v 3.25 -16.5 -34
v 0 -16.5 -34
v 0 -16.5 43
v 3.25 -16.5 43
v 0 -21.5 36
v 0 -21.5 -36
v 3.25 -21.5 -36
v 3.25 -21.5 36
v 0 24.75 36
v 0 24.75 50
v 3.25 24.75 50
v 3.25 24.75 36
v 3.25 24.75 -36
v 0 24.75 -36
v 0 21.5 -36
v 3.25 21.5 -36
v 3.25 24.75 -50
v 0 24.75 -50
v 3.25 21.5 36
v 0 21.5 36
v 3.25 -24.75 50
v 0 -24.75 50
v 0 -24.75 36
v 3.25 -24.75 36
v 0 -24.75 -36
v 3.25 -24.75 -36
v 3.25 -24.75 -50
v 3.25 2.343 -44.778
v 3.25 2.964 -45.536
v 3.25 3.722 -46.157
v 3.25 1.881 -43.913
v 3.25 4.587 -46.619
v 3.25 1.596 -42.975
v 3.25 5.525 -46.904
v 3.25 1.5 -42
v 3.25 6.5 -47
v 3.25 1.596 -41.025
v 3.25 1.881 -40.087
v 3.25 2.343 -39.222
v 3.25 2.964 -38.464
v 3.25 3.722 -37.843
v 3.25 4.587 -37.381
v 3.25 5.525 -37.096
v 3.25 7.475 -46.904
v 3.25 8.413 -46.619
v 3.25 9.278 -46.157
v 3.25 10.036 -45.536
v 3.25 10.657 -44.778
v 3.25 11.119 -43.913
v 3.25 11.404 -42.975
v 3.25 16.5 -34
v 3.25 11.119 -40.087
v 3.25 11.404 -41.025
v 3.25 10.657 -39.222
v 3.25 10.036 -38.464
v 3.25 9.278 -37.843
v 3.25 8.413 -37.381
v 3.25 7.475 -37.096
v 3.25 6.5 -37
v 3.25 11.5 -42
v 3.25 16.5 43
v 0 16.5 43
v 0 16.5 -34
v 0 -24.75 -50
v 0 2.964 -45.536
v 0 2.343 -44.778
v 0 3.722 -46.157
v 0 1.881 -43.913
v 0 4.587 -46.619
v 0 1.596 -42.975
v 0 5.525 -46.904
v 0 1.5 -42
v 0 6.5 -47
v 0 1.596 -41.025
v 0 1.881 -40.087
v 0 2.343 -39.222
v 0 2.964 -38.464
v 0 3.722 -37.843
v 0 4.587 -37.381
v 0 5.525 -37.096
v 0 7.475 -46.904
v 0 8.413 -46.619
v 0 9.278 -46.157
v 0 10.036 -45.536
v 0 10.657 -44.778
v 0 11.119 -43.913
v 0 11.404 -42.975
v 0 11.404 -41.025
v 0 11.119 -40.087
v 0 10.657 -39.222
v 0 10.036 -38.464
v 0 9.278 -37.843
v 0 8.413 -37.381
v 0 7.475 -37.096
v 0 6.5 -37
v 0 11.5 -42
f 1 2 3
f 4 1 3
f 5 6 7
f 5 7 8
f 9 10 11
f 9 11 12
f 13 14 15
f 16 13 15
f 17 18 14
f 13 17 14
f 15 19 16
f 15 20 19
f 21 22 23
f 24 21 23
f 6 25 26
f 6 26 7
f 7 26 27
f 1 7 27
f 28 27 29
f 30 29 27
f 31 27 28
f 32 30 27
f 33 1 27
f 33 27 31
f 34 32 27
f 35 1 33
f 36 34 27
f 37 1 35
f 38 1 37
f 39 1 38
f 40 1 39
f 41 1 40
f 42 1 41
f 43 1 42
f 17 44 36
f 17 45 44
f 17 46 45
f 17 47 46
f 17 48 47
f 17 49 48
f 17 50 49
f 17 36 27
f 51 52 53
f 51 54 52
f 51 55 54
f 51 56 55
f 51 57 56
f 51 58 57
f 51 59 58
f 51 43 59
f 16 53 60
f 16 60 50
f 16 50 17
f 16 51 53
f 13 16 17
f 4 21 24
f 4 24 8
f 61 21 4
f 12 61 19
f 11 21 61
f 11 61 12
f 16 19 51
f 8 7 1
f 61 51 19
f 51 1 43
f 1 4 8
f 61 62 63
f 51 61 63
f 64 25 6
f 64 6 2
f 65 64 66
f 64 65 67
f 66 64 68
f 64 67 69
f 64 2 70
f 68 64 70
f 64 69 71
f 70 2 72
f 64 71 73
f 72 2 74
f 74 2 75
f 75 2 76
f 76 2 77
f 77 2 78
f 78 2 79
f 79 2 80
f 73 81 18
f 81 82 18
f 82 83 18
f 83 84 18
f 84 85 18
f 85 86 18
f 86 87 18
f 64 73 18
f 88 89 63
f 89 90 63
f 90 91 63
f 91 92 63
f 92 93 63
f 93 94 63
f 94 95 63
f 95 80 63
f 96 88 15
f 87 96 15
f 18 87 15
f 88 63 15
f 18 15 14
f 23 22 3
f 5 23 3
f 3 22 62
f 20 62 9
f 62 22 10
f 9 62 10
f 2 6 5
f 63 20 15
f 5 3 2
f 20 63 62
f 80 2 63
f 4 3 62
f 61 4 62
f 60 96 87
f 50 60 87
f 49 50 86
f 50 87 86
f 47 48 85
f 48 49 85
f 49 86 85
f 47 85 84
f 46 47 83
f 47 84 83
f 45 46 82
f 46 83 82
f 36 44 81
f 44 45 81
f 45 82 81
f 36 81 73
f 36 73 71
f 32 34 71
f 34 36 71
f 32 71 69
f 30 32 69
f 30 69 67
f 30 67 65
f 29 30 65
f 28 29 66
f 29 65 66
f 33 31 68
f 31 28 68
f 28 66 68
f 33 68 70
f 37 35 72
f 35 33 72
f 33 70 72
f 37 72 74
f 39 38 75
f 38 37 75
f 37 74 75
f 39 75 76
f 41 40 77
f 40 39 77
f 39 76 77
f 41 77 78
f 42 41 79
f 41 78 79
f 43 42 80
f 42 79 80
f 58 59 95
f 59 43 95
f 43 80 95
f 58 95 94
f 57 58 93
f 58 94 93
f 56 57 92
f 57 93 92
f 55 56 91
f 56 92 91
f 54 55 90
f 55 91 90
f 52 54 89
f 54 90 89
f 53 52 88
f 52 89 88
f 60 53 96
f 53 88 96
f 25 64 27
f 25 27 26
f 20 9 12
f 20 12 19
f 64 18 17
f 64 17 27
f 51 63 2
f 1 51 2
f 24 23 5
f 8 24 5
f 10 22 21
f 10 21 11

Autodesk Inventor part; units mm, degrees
ref_plane "YZ Plane" through (0, 0, 0) normal (1, 0, 0) x (0, 1, 0)
ref_plane "XZ Plane" through (0, 0, 0) normal (0, 1, 0) x (-1, 0, 0)
ref_plane "XY Plane" through (0, 0, 0) normal (0, 0, 1) x (1, 0, 0)
sketch "Sketch1" plane through (0, 0, 0) normal (1, 0, 0) x (0, 1, 0)
  line L0 (-92.7646, -8.503) -> (-89.7646, -8.503)
  line L1 (-89.7646, -8.503) -> (-89.7646, -11.753)
  line L2 (-89.7646, -11.753) -> (-92.7646, -11.753)
  line L3 (-92.7646, -11.753) -> (-92.7646, -8.503)
  line L4 (-92.7646, -21.6527) -> (-89.7646, -21.6527)
  line L5 (-89.7646, -21.6527) -> (-89.7646, -21.7527)
  line L6 (-89.7646, -21.7527) -> (-92.7646, -21.7527)
  line L7 (-92.7646, -21.7527) -> (-92.7646, -21.6527)
  line L8 (-21.5, 50) -> (21.5, 50)
  line L9 (21.5, 50) -> (21.5, -50)
  line L10 (21.5, -50) -> (-21.5, -50)
  line L11 (-21.5, -50) -> (-21.5, 50)
  line L12 (0, 50) -> (0, -50) construction
  line L13 (-21.5, 0) -> (21.5, 0) construction
  line L14 (-16.5, 43) -> (16.5, 43)
  line L15 (16.5, 43) -> (16.5, -34)
  line L16 (16.5, -34) -> (-16.5, -34)
  line L17 (-16.5, -34) -> (-16.5, 43)
  circle A0 centre (6.5, -42) radius 5
  line L18 (-21.5, 50) -> (-24.75, 50)
  line L19 (-24.75, 50) -> (-24.75, 36)
  line L20 (-24.75, 36) -> (-21.5, 36)
  line L21 (-21.5, 36) -> (-21.5, 50)
  line L22 (21.5, 50) -> (24.75, 50)
  line L23 (24.75, 50) -> (24.75, 36)
  line L24 (24.75, 36) -> (21.5, 36)
  line L25 (21.5, 36) -> (21.5, 50)
  line L26 (-21.5, -50) -> (-24.75, -50)
  line L27 (-24.75, -50) -> (-24.75, -36)
  line L28 (-24.75, -36) -> (-21.5, -36)
  line L29 (-21.5, -36) -> (-21.5, -50)
  line L30 (21.5, -36) -> (21.5, -50)
  line L31 (24.75, -50) -> (24.75, -36)
  line L32 (24.75, -36) -> (21.5, -36)
  line L33 (21.5, -50) -> (24.75, -50)
  point P0 (0, 0)
  dimension "d0" = 3
  dimension "mat" = 3.25
  dimension "d2" = 3
  dimension "kerf" = 0.1
  dimension "d4" = 43
  dimension "d5" = 100
  dimension "d9" = 7
  dimension "d10" = 16
  dimension "d11" = 5
  dimension "d12" = 5
  dimension "d13" = 10
  dimension "d15" = 3
  dimension "d16" = 3.25
  dimension "d17" = 14
  dimension "d24" = 10
extrude "Extrusion1" [suppressed]
extrude "Extrusion2" add sketch "Sketch1" along normal blind 3.25 contours L11 L20 L19 L18 | L22 L23 L24 L9 | L11 L26 L27 L28 | L32 L31 L33 L9
extrude "Extrusion3" add sketch "Sketch1" along normal blind 3.25 contours L8 L9 L10 L11
equation "\"d16\" = mat"
equation "\"d18\" = mat"
equation "\"d20\" = mat"
equation "\"d22\" = mat"
properties part number "body-side2"
